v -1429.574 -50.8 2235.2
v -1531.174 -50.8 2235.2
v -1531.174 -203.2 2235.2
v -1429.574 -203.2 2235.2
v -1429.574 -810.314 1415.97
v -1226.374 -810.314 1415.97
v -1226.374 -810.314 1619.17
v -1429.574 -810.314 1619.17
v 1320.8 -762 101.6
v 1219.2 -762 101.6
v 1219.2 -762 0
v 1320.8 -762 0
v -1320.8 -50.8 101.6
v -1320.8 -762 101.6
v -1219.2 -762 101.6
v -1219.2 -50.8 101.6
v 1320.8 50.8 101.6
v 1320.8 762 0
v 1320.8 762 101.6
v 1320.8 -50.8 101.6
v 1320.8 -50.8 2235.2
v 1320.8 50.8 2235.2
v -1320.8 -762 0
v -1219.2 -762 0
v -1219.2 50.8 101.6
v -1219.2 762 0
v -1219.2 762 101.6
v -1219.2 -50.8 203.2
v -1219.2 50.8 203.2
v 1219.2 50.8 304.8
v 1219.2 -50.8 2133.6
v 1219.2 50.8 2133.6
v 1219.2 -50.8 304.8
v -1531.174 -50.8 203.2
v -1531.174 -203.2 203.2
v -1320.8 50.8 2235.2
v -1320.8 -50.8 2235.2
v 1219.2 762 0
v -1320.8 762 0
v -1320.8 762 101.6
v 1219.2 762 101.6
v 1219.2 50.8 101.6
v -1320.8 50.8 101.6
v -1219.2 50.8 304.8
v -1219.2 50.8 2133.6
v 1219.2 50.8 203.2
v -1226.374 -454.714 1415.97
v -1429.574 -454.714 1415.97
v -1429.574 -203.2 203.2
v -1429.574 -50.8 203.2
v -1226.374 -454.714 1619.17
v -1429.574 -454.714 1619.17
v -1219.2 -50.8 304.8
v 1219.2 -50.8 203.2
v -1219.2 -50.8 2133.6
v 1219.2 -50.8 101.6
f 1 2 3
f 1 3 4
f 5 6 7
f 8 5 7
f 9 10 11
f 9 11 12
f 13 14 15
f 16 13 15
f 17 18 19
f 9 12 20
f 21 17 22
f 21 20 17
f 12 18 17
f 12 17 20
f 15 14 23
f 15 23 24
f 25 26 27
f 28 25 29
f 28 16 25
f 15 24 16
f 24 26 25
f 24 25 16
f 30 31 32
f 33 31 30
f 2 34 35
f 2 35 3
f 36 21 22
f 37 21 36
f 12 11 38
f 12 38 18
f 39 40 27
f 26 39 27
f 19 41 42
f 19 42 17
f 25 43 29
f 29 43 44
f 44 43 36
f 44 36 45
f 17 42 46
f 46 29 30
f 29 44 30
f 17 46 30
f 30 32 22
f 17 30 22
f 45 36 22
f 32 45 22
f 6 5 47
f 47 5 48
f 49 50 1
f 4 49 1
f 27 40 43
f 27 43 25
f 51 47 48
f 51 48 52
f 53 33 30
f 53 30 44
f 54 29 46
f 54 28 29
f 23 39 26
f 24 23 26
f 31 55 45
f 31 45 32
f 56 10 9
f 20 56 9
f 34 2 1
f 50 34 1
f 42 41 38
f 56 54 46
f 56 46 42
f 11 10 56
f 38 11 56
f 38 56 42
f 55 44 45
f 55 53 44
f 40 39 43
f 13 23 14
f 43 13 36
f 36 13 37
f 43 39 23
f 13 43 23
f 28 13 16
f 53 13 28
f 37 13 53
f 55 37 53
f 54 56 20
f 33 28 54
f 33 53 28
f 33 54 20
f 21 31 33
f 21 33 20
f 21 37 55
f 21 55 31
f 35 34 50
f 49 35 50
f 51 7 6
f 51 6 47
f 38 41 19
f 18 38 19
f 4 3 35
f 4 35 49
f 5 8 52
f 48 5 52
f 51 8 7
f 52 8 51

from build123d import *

# Parameters (mm, degrees)
F1_DEPTH      = 50.8
F1_DEPTH_BACK = 50.8
F0_W          = 101.6
F0_H          = 101.6
F2_DEPTH      = 762
F2_DEPTH_BACK = 762
F3_W          = 101.6
F3_H          = 2032
F4_DEPTH      = 152.4
F5_W          = 355.6
F5_H          = 203.2
F6_DEPTH      = 203.2
F7_DEPTH      = 203.2


with BuildPart() as f1:
    # F0 (on Front) → F1 (new body, two sides)
    with BuildSketch(Plane.XZ) as f1_sk:
        Polygon((-1219.2, 203.2), (0, 203.2), (1219.2, 203.2), (1219.2, 101.6), (1320.8, 101.6), (1320.8, 2235.2), (0, 2235.2), (-1320.8, 2235.2), (-1320.8, 101.6), (-1219.2, 101.6), align=None)
        Polygon((-1219.2, 2133.6), (0, 2133.6), (1219.2, 2133.6), (1219.2, 304.8), (0, 304.8), (-1219.2, 304.8), align=None, mode=Mode.SUBTRACT)
    extrude(amount=F1_DEPTH)
    extrude(f1_sk.sketch, amount=-F1_DEPTH_BACK)

    # F0 (on Front) → F2 (join, two sides)
    with BuildSketch(Plane.XZ) as f2_sk:
        with Locations((-1270, 50.8)):
            Rectangle(F0_W, F0_H)
        with Locations((1270, 50.8)):
            Rectangle(F0_W, F0_H)
    extrude(amount=F2_DEPTH)
    extrude(f2_sk.sketch, amount=-F2_DEPTH_BACK)


with BuildPart() as f4:
    # F3 (on face) → F4 (new body)
    with BuildSketch(Plane.XZ.offset(50.8)):
        with Locations((-1480.374272, 1219.2)):
            Rectangle(F3_W, F3_H)
    extrude(amount=F4_DEPTH)


with BuildPart() as f6:
    # F5 (on face) → F6 (new body)
    with BuildSketch(Plane.YZ.offset(-1429.574272)):
        with Locations((-632.513505, 1517.570019)):
            Rectangle(F5_W, F5_H)
    extrude(amount=F6_DEPTH)

    # F5 (on face) → F7 (join)
    with BuildSketch(Plane.YZ.offset(-1429.574272)):
        with Locations((-632.513505, 1517.570019)):
            Rectangle(F5_W, F5_H)
    extrude(amount=F7_DEPTH)


solid = Compound([f1.part, f4.part, f6.part])
